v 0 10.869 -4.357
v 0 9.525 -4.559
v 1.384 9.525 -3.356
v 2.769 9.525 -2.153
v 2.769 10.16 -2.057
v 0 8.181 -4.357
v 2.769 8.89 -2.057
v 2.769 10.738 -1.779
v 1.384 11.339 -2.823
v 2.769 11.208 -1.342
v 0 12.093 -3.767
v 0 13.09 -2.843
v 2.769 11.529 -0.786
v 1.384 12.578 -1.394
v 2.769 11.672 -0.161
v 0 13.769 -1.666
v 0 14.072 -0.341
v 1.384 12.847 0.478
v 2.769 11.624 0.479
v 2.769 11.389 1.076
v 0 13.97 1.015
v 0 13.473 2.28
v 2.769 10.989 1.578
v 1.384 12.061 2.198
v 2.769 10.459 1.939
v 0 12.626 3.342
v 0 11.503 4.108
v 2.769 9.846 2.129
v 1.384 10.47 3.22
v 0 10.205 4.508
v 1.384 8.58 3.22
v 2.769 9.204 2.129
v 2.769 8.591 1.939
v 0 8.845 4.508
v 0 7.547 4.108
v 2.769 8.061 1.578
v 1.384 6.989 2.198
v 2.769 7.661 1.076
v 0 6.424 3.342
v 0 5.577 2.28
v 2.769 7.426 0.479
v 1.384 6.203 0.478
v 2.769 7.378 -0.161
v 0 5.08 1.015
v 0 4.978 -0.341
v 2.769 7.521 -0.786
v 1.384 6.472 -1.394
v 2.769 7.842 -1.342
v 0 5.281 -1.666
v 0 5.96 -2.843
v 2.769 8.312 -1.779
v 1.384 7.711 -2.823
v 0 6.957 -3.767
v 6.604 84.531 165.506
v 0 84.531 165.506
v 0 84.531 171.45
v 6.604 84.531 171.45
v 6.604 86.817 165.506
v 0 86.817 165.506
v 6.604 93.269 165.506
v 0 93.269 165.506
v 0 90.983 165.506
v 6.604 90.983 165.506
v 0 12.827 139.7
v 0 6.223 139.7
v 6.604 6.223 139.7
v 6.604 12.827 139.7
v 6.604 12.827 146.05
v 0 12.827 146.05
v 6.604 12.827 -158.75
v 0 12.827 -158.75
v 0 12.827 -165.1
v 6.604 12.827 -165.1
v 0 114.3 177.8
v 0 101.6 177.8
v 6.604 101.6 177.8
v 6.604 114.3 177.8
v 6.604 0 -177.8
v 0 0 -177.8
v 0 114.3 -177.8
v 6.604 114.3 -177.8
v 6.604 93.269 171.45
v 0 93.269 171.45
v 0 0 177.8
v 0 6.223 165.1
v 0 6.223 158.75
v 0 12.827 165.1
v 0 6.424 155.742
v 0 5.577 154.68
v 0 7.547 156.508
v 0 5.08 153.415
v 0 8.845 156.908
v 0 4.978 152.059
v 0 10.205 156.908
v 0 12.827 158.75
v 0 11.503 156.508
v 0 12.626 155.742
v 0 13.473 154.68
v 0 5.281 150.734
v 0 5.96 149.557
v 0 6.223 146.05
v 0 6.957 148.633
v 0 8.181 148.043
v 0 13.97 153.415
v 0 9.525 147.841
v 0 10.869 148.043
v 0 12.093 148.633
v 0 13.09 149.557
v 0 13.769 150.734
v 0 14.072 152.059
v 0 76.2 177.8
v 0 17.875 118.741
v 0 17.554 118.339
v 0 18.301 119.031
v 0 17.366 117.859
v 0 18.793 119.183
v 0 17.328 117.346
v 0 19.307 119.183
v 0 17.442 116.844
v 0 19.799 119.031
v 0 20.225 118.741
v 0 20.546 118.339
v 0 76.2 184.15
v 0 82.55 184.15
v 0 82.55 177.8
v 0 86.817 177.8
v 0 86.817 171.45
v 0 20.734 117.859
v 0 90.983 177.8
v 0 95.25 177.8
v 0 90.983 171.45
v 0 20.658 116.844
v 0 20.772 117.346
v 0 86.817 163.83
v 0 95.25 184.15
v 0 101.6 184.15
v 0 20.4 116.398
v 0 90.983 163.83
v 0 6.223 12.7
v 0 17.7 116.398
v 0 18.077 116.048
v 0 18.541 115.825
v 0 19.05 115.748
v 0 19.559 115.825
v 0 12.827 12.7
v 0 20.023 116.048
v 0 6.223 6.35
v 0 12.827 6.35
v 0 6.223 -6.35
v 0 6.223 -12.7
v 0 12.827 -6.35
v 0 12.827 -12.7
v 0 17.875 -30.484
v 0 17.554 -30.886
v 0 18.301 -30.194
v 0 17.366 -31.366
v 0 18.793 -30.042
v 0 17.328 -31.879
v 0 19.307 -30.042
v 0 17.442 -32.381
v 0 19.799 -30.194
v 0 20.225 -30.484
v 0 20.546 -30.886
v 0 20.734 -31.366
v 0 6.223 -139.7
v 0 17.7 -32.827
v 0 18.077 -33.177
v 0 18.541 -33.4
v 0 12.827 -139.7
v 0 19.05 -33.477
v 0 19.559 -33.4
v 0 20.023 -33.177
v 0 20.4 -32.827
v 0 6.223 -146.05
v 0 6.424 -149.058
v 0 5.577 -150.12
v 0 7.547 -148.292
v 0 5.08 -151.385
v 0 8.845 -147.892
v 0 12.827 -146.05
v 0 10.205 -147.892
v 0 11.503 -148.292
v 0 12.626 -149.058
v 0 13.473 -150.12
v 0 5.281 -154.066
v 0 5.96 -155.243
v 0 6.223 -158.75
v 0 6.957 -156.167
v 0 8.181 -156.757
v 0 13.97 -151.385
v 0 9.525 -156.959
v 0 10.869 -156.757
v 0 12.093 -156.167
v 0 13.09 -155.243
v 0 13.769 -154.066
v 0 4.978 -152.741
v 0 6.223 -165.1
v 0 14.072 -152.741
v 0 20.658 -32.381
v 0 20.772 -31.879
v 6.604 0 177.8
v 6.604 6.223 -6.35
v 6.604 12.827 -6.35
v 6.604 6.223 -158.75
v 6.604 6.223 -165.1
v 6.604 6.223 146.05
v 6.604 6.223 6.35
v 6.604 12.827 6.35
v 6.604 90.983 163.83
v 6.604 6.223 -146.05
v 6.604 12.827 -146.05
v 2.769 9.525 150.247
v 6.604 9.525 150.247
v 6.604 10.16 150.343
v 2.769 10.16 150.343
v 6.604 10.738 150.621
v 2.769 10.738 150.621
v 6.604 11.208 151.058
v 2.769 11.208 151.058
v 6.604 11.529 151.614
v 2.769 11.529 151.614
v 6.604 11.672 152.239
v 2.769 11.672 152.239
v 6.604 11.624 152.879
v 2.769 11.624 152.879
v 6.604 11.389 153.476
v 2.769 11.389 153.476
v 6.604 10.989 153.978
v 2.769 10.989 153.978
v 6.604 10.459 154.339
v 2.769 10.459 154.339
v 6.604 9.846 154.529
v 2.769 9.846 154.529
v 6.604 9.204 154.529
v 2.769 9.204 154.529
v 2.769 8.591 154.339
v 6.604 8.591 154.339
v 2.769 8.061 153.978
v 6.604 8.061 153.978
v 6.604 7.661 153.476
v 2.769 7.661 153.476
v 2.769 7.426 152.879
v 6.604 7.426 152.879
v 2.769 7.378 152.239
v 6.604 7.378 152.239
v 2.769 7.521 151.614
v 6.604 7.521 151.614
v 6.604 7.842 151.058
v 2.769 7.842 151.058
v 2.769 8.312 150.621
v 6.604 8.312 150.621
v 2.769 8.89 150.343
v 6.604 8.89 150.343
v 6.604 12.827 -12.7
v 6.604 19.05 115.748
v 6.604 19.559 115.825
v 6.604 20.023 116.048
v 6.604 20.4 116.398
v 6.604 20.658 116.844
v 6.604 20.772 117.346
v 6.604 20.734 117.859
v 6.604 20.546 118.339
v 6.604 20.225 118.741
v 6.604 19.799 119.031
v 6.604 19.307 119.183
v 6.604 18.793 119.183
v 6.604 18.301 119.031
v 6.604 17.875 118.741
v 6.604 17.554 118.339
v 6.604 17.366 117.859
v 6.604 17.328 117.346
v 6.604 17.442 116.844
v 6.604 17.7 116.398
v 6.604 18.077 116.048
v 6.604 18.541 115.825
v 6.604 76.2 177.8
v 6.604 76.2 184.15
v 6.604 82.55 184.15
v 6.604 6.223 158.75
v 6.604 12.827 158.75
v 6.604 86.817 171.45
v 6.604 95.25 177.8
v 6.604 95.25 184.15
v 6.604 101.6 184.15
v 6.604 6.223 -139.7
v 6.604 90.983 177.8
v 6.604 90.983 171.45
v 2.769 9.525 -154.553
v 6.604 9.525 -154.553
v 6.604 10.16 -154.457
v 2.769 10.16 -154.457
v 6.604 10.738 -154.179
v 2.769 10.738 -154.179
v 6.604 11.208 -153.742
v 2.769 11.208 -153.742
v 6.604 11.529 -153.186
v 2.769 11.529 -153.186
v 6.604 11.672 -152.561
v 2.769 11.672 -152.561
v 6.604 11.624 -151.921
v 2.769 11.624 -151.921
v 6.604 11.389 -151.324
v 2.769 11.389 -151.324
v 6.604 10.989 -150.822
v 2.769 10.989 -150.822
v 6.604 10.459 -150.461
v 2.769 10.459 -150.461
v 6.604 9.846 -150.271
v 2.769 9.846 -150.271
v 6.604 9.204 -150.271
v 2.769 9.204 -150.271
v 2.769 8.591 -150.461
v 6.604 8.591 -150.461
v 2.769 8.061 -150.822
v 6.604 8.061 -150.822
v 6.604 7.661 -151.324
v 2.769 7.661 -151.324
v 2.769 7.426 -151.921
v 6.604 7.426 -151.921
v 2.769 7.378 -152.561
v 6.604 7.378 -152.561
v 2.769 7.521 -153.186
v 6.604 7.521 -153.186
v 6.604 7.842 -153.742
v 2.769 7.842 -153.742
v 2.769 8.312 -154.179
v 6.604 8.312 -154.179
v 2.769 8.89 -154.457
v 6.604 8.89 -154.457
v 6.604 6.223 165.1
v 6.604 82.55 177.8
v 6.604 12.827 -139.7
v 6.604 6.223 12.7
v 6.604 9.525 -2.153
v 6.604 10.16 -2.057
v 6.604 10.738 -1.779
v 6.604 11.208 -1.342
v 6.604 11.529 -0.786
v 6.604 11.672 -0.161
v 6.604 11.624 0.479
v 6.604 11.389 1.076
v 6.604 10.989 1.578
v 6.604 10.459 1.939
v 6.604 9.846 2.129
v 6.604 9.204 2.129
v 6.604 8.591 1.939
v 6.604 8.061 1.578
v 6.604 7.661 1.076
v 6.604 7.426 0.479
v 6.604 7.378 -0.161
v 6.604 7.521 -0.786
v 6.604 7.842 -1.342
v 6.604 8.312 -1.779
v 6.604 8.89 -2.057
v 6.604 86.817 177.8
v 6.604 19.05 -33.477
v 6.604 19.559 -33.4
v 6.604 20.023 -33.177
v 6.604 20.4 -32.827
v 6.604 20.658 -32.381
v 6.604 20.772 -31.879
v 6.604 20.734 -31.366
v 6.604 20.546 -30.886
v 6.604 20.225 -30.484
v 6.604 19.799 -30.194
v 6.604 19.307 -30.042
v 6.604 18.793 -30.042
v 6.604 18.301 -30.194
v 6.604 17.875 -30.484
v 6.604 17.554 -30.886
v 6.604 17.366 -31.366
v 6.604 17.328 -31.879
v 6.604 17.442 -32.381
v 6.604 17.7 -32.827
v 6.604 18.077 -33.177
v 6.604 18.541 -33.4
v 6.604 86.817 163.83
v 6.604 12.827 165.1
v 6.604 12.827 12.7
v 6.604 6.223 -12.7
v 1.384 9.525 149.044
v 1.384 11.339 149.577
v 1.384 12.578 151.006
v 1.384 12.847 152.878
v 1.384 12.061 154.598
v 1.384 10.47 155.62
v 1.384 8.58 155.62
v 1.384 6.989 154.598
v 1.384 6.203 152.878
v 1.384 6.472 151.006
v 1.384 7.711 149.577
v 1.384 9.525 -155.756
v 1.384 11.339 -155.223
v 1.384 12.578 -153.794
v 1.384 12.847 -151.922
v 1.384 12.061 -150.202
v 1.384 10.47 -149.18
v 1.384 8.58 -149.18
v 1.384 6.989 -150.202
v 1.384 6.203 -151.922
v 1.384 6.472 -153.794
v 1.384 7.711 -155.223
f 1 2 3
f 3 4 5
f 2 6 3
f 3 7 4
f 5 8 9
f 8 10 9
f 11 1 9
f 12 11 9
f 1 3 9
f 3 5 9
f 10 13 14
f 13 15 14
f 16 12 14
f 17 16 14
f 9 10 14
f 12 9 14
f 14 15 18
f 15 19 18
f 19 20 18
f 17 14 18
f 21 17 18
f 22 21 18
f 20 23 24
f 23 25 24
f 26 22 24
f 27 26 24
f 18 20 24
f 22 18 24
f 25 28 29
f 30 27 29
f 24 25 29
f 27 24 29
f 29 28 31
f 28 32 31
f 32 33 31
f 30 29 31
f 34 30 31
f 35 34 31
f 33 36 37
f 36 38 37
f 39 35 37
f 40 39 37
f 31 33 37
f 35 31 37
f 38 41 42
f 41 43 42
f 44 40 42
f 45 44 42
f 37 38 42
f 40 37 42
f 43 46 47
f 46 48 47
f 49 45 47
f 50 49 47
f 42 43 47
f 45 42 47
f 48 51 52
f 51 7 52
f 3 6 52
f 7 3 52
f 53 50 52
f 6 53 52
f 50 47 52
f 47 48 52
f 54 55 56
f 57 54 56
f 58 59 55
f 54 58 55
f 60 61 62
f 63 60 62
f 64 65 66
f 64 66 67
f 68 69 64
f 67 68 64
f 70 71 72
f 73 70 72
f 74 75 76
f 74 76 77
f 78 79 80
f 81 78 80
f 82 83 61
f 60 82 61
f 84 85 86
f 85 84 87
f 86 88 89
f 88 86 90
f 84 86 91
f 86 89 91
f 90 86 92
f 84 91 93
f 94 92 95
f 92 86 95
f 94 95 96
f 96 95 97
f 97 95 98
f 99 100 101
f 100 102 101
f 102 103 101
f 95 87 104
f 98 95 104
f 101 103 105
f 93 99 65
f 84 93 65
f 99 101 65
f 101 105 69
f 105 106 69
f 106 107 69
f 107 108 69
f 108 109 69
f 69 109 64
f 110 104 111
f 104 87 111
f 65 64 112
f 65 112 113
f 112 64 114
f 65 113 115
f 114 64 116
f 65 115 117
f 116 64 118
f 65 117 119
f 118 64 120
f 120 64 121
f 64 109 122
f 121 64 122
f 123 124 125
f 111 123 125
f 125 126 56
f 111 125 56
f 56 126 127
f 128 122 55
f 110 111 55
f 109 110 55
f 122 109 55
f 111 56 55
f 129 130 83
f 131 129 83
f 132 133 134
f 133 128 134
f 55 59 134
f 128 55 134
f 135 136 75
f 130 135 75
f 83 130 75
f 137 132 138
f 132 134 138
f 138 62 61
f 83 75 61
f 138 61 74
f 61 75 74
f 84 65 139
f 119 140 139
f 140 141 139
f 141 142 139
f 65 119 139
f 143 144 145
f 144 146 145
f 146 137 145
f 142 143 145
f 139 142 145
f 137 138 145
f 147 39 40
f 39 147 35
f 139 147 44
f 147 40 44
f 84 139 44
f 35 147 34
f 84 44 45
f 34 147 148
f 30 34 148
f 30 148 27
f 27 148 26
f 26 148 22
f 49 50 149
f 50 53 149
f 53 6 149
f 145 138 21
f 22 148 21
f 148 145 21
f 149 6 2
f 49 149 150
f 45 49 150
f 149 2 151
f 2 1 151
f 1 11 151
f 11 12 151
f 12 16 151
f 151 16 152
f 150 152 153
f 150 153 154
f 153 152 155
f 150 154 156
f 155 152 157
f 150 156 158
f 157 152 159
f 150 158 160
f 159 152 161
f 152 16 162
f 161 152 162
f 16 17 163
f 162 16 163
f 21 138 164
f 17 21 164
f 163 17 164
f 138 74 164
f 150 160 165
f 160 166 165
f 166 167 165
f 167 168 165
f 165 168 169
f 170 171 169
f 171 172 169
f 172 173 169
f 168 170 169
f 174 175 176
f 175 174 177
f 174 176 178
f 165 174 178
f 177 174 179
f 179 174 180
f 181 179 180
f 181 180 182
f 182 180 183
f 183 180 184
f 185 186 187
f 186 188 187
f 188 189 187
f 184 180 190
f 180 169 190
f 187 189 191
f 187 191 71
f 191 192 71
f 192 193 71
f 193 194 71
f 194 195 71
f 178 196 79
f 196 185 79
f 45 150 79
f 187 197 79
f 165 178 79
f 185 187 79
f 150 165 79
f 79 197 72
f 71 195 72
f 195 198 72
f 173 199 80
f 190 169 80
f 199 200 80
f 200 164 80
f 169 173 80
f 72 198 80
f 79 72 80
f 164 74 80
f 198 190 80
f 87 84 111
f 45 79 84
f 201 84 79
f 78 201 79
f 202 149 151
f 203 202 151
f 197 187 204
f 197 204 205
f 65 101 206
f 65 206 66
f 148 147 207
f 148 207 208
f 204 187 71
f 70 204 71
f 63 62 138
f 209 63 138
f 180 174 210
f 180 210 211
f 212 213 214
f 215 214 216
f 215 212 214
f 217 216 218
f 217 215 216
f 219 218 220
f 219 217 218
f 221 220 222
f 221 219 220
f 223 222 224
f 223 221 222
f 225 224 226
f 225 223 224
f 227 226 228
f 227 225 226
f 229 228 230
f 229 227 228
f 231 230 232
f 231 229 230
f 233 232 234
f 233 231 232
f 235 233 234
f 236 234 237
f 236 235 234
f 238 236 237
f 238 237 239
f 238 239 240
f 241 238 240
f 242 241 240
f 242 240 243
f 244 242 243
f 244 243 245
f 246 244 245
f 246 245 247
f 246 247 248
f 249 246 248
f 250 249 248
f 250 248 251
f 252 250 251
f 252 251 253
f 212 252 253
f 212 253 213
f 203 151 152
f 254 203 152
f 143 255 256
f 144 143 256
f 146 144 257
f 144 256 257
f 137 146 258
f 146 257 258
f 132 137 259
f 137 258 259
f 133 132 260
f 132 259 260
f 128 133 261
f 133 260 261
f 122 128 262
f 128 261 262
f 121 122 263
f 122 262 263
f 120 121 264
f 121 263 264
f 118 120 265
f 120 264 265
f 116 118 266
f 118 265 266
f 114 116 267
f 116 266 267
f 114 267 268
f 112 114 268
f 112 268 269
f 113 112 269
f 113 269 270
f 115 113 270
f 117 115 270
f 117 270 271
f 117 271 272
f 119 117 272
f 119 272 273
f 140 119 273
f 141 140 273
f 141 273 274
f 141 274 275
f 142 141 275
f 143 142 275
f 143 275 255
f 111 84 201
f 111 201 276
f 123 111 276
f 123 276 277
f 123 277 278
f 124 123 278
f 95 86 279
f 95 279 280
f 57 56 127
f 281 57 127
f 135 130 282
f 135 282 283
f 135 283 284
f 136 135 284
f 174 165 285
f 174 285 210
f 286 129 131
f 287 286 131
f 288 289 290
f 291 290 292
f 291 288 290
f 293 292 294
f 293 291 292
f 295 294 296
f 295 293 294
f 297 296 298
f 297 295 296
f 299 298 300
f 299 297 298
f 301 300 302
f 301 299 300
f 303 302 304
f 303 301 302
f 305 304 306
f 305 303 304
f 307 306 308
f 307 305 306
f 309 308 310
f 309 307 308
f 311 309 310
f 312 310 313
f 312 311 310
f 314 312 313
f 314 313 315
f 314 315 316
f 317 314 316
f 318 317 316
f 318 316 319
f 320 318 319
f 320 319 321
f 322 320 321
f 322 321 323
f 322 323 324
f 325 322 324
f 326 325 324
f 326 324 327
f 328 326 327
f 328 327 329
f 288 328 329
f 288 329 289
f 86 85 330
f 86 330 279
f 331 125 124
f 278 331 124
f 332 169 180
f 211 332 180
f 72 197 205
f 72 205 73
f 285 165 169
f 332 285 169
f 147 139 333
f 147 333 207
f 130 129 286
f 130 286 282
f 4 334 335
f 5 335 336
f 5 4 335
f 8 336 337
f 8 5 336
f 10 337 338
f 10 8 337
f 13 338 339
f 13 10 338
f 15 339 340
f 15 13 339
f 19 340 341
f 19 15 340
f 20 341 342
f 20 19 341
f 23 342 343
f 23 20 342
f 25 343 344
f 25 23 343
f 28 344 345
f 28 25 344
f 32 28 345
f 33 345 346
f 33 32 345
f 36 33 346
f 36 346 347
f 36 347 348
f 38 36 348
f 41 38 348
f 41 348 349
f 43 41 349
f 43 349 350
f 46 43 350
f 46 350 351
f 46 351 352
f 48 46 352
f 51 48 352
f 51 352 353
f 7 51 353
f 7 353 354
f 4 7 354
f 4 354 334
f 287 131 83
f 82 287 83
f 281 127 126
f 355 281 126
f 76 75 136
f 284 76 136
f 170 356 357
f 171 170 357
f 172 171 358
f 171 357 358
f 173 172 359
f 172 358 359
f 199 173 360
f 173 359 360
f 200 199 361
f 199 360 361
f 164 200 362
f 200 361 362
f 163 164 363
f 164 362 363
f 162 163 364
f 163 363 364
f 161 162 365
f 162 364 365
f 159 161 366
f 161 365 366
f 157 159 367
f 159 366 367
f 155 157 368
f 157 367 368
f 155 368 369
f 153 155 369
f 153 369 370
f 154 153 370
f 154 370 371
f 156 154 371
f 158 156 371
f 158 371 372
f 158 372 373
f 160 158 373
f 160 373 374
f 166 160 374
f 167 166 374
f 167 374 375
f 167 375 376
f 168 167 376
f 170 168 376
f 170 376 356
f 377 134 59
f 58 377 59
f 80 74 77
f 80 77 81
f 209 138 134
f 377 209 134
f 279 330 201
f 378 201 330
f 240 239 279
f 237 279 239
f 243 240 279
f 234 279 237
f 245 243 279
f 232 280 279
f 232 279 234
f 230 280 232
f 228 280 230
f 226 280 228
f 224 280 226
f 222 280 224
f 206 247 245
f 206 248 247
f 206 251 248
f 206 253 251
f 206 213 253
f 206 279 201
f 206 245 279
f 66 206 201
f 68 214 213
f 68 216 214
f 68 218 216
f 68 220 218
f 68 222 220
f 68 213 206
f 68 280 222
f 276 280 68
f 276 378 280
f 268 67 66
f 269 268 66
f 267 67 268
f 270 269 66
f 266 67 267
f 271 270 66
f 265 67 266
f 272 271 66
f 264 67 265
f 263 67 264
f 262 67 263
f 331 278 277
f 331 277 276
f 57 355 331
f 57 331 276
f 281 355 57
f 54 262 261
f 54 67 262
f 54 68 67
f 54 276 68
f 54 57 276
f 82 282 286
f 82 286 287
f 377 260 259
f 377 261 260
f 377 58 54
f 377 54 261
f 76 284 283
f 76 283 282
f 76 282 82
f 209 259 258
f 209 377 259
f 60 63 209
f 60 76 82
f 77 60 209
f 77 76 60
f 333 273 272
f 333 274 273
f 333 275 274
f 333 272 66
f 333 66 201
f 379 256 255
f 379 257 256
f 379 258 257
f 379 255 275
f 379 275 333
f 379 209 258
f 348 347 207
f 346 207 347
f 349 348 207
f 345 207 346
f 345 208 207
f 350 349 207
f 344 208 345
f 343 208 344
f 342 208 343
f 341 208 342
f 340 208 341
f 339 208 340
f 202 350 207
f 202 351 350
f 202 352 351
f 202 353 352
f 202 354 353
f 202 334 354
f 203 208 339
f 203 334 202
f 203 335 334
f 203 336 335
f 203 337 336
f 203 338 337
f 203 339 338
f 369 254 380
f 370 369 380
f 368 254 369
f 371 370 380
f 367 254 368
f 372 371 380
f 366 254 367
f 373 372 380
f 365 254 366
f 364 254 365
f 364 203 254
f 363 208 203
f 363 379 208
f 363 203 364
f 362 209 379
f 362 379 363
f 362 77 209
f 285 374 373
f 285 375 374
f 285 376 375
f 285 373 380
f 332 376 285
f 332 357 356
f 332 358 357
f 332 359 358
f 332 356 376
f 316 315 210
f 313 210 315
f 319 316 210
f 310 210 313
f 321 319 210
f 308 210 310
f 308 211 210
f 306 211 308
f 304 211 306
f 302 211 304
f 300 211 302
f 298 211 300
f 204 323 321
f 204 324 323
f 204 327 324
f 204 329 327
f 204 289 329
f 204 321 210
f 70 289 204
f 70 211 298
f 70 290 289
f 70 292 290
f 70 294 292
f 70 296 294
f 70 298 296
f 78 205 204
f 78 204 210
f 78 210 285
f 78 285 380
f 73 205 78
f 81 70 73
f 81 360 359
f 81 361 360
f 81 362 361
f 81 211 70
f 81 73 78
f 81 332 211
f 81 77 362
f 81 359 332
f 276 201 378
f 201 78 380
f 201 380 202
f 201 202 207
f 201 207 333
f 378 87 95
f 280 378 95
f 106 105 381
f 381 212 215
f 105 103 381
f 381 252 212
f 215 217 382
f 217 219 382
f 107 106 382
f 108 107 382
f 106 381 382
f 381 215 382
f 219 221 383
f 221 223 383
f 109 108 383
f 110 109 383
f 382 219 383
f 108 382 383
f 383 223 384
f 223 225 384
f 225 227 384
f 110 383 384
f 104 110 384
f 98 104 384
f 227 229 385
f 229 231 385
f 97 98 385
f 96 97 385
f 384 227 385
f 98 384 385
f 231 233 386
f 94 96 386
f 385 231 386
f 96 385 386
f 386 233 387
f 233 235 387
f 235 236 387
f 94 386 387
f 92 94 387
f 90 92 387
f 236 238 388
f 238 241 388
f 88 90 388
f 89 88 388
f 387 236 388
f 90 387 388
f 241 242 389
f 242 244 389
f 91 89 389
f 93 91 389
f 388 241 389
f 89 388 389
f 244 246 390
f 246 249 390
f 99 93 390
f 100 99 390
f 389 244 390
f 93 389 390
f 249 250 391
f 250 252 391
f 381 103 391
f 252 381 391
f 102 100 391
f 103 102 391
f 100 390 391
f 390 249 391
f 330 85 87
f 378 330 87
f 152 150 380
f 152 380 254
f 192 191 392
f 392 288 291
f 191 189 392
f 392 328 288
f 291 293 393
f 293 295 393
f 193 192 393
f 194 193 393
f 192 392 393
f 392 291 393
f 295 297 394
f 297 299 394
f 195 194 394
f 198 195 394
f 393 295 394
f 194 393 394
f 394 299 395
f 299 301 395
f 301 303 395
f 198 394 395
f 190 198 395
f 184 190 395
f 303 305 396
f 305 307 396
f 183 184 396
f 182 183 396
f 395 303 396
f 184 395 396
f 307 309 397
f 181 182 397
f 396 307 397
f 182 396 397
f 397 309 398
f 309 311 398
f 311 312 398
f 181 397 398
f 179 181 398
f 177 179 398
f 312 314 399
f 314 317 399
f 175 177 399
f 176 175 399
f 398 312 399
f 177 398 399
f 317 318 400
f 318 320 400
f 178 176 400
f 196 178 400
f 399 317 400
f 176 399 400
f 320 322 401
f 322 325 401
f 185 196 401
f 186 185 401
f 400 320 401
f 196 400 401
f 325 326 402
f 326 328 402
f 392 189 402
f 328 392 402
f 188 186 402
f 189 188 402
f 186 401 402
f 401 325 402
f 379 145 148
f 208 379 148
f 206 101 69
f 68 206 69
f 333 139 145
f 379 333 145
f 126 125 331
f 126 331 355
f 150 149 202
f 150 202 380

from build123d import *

# Parameters (mm, degrees)
SKETCH1_W                                         = 355.6
SKETCH1_H                                         = 114.3
SKETCH1_R                                         = 2.15265
SKETCH1_W_2                                       = 6.35
SKETCH1_H_2                                       = 6.604
BOSS_EXTRUDE1_DEPTH                               = 6.604
CUT_EXTRUDE1_DEPTH                                = 7.604
SKETCH6_W                                         = 6.35
SKETCH6_H                                         = 6.35
BOSS_EXTRUDE2_DEPTH                               = 6.604
CSK_FOR_8_FLAT_HEAD_SOCKET_CAP_SCREW1_D           = 4.3053
CSK_FOR_8_FLAT_HEAD_SOCKET_CAP_SCREW1_CSINK_D     = 9.1186
CSK_FOR_8_FLAT_HEAD_SOCKET_CAP_SCREW1_CSINK_ANGLE = 82
F_8_32_TAPPED_HOLE1_D                             = 3.4544
F_8_32_TAPPED_HOLE1_DEPTH                         = 10.7188
F_8_32_TAPPED_HOLE1_TIP                           = 1.037806461


with BuildPart() as part:
    # Sketch1 → Boss-Extrude1 (new body)
    with BuildSketch(Plane(origin=(0, 0, 0), x_dir=(0, 0, -1), z_dir=(1, 0, 0))):
        with Locations((0, 57.15)):
            Rectangle(SKETCH1_W, SKETCH1_H)
        with Locations((-152.4, 9.525)):
            Circle(SKETCH1_R, mode=Mode.SUBTRACT)
        with Locations((0, 9.525)):
            Circle(SKETCH1_R, mode=Mode.SUBTRACT)
        with Locations((152.4, 9.525)):
            Circle(SKETCH1_R, mode=Mode.SUBTRACT)
        with Locations((-142.875, 9.525)):
            Rectangle(SKETCH1_W_2, SKETCH1_H_2, mode=Mode.SUBTRACT)
        with Locations((-161.925, 9.525)):
            Rectangle(SKETCH1_W_2, SKETCH1_H_2, mode=Mode.SUBTRACT)
        with Locations((9.525, 9.525)):
            Rectangle(SKETCH1_W_2, SKETCH1_H_2, mode=Mode.SUBTRACT)
        with Locations((-9.525, 9.525)):
            Rectangle(SKETCH1_W_2, SKETCH1_H_2, mode=Mode.SUBTRACT)
        with Locations((161.925, 9.525)):
            Rectangle(SKETCH1_W_2, SKETCH1_H_2, mode=Mode.SUBTRACT)
        with Locations((142.875, 9.525)):
            Rectangle(SKETCH1_W_2, SKETCH1_H_2, mode=Mode.SUBTRACT)
    extrude(amount=BOSS_EXTRUDE1_DEPTH)

    # Sketch5 → Cut-Extrude1 (cut, through all)
    with BuildSketch(Plane.ZY):
        Polygon((177.8, 90.9828), (171.45, 90.9828), (171.45, 93.2688), (165.5064, 93.2688), (165.5064, 90.9828), (163.83, 90.9828), (163.83, 86.8172), (165.5064, 86.8172), (165.5064, 84.5312), (171.45, 84.5312), (171.45, 86.8172), (177.8, 86.8172), align=None)
    extrude(amount=-CUT_EXTRUDE1_DEPTH, mode=Mode.SUBTRACT)

    # Sketch6 → Boss-Extrude2 (add)
    with BuildSketch(Plane.ZY):
        with Locations((180.975, 98.425)):
            Rectangle(SKETCH6_W, SKETCH6_H)
        with Locations((180.975, 79.375)):
            Rectangle(SKETCH6_W, SKETCH6_H)
    extrude(amount=-BOSS_EXTRUDE2_DEPTH)

    # CSK for #8 Flat Head Socket Cap Screw1 (through all)
    with Locations(Plane.ZY):
        with Locations((-152.4, 9.525), (0, 9.525), (152.4, 9.525)):
            CounterSinkHole(CSK_FOR_8_FLAT_HEAD_SOCKET_CAP_SCREW1_D / 2, CSK_FOR_8_FLAT_HEAD_SOCKET_CAP_SCREW1_CSINK_D / 2, counter_sink_angle=CSK_FOR_8_FLAT_HEAD_SOCKET_CAP_SCREW1_CSINK_ANGLE)

    # #8-32 Tapped Hole1
    with Locations(Plane.ZY):
        with Locations((117.475, 19.05), (-31.75, 19.05)):
            Hole(F_8_32_TAPPED_HOLE1_D / 2, depth=F_8_32_TAPPED_HOLE1_DEPTH)
            with Locations((0, 0, -(F_8_32_TAPPED_HOLE1_DEPTH + F_8_32_TAPPED_HOLE1_TIP / 2))):  # 118° drill point
                Cone(0, F_8_32_TAPPED_HOLE1_D / 2, F_8_32_TAPPED_HOLE1_TIP, mode=Mode.SUBTRACT)


solid = part.part
